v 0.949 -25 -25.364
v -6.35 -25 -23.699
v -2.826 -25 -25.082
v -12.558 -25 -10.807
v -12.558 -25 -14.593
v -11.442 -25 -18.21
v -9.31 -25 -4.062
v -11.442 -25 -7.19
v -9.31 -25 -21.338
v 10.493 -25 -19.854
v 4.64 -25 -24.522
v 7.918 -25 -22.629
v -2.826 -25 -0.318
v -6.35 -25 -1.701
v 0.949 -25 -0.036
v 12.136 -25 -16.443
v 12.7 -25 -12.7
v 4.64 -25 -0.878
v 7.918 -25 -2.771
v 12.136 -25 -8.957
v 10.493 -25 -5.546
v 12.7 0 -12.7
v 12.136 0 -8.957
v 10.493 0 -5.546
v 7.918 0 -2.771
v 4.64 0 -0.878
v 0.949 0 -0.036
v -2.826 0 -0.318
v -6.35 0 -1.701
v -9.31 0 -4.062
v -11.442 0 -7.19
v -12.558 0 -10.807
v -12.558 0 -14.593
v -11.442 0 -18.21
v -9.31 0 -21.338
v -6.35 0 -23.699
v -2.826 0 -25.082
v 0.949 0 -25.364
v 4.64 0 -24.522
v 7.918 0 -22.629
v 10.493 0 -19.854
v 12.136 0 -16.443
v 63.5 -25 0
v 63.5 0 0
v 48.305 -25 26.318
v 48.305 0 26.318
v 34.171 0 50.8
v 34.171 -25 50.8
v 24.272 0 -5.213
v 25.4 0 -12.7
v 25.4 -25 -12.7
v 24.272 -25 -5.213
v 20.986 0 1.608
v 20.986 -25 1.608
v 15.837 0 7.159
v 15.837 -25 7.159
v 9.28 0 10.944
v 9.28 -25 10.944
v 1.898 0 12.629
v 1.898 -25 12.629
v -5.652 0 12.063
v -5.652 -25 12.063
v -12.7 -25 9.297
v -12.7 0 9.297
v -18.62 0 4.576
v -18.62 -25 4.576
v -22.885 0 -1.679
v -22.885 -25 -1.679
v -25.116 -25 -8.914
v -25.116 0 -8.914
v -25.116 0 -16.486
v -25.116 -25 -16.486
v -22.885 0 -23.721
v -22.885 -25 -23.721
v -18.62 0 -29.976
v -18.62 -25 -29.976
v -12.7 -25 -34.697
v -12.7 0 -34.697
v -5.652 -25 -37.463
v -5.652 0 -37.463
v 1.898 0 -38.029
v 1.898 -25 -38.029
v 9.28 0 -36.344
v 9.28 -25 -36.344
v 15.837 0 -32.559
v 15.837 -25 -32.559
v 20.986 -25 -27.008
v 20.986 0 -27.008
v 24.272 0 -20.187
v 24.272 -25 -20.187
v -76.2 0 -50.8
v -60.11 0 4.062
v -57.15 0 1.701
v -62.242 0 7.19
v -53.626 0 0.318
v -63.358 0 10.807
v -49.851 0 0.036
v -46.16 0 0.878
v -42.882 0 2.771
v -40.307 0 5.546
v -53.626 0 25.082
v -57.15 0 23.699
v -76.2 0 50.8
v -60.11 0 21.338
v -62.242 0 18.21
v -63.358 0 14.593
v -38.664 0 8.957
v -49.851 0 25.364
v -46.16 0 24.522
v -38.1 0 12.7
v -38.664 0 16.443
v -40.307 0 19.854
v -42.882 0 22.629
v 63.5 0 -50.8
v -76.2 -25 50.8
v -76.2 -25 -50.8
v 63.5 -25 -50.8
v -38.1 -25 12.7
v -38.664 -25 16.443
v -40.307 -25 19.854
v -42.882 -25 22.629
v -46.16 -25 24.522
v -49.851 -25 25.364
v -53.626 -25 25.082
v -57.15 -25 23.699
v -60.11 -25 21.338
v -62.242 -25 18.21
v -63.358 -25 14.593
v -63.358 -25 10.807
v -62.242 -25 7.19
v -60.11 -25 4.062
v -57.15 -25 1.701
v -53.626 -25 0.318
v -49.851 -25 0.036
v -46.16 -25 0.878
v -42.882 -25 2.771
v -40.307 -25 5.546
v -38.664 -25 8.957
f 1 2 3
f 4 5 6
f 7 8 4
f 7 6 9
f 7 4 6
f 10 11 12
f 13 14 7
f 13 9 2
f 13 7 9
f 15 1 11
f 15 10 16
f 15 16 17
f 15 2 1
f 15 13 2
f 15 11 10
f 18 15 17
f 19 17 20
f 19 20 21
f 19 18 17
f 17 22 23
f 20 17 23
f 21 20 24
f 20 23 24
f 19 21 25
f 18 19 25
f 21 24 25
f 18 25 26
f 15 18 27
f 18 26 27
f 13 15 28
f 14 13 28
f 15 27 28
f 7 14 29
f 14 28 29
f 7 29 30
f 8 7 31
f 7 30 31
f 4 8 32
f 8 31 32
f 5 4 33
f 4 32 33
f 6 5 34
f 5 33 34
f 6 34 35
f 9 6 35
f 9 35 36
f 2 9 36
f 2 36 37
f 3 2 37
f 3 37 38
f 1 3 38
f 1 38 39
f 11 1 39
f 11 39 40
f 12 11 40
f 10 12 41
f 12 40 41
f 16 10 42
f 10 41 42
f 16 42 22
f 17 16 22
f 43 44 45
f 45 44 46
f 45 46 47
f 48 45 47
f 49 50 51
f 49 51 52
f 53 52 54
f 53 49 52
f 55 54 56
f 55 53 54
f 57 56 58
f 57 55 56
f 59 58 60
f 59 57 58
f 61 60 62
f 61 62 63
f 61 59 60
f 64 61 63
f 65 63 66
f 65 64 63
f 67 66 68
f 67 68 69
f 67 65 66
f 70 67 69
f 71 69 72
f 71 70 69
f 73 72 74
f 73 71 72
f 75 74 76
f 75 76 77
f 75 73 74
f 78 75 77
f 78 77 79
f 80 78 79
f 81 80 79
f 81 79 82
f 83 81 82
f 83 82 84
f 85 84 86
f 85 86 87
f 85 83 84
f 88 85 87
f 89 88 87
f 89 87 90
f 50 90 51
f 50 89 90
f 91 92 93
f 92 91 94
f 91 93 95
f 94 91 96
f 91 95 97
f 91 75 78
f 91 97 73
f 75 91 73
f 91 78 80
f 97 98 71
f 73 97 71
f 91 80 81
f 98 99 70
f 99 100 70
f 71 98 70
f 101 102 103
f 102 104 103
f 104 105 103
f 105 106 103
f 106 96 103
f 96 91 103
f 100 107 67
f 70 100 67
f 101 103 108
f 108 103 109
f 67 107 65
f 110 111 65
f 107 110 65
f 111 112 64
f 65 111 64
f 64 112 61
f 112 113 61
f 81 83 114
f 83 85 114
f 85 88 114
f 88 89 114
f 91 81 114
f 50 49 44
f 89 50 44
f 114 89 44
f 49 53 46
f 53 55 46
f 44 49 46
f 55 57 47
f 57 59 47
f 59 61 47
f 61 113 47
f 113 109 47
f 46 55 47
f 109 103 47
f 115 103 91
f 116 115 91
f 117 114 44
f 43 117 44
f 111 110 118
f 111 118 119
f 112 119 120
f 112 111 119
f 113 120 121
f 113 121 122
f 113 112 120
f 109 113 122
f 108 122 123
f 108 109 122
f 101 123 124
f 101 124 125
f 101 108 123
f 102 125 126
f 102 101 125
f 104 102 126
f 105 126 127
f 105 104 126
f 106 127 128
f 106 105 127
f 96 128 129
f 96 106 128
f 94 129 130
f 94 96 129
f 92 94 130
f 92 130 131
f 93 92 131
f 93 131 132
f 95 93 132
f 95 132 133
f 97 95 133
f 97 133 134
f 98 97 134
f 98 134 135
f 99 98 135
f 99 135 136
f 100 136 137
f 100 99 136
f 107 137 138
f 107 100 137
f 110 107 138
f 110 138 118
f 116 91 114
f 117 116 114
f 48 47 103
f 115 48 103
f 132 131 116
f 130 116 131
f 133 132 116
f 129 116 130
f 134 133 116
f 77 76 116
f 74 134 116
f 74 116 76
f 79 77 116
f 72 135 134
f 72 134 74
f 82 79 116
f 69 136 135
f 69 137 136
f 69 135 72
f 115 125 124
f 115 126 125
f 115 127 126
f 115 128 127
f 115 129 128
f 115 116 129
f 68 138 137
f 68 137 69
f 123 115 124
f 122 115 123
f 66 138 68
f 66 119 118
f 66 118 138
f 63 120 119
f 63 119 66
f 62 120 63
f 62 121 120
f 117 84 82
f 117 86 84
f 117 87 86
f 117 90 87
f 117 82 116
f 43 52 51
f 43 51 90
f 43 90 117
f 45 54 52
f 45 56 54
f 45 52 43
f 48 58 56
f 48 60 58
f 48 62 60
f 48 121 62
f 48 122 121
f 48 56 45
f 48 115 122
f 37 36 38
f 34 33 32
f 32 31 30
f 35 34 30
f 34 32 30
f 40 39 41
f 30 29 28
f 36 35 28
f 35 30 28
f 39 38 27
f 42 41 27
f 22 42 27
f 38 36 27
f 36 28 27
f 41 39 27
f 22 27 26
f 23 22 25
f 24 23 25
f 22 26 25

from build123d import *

# Parameters (mm, degrees)
F0_R     = 25.4
F0_R_2   = 12.7
F1_DEPTH = 25


with BuildPart() as f1:
    # F0 (on Front) → F1 (new body)
    with BuildSketch(Plane.XZ):
        Polygon((-50.8, 50.8), (-76.2, 50.8), (-76.2, 12.7), (-76.2, -50.8), (0, -50.8), (63.5, -50.8), (63.5, 0), (48.305189, 26.318185), (34.170606, 50.8), align=None)
        with Locations((0, -12.7)):
            Circle(F0_R, mode=Mode.SUBTRACT)
        with Locations((-50.8, 12.7)):
            Circle(F0_R_2, mode=Mode.SUBTRACT)
        with Locations((0, -12.7)):
            Circle(F0_R_2)
    extrude(amount=F1_DEPTH)


solid = f1.part
